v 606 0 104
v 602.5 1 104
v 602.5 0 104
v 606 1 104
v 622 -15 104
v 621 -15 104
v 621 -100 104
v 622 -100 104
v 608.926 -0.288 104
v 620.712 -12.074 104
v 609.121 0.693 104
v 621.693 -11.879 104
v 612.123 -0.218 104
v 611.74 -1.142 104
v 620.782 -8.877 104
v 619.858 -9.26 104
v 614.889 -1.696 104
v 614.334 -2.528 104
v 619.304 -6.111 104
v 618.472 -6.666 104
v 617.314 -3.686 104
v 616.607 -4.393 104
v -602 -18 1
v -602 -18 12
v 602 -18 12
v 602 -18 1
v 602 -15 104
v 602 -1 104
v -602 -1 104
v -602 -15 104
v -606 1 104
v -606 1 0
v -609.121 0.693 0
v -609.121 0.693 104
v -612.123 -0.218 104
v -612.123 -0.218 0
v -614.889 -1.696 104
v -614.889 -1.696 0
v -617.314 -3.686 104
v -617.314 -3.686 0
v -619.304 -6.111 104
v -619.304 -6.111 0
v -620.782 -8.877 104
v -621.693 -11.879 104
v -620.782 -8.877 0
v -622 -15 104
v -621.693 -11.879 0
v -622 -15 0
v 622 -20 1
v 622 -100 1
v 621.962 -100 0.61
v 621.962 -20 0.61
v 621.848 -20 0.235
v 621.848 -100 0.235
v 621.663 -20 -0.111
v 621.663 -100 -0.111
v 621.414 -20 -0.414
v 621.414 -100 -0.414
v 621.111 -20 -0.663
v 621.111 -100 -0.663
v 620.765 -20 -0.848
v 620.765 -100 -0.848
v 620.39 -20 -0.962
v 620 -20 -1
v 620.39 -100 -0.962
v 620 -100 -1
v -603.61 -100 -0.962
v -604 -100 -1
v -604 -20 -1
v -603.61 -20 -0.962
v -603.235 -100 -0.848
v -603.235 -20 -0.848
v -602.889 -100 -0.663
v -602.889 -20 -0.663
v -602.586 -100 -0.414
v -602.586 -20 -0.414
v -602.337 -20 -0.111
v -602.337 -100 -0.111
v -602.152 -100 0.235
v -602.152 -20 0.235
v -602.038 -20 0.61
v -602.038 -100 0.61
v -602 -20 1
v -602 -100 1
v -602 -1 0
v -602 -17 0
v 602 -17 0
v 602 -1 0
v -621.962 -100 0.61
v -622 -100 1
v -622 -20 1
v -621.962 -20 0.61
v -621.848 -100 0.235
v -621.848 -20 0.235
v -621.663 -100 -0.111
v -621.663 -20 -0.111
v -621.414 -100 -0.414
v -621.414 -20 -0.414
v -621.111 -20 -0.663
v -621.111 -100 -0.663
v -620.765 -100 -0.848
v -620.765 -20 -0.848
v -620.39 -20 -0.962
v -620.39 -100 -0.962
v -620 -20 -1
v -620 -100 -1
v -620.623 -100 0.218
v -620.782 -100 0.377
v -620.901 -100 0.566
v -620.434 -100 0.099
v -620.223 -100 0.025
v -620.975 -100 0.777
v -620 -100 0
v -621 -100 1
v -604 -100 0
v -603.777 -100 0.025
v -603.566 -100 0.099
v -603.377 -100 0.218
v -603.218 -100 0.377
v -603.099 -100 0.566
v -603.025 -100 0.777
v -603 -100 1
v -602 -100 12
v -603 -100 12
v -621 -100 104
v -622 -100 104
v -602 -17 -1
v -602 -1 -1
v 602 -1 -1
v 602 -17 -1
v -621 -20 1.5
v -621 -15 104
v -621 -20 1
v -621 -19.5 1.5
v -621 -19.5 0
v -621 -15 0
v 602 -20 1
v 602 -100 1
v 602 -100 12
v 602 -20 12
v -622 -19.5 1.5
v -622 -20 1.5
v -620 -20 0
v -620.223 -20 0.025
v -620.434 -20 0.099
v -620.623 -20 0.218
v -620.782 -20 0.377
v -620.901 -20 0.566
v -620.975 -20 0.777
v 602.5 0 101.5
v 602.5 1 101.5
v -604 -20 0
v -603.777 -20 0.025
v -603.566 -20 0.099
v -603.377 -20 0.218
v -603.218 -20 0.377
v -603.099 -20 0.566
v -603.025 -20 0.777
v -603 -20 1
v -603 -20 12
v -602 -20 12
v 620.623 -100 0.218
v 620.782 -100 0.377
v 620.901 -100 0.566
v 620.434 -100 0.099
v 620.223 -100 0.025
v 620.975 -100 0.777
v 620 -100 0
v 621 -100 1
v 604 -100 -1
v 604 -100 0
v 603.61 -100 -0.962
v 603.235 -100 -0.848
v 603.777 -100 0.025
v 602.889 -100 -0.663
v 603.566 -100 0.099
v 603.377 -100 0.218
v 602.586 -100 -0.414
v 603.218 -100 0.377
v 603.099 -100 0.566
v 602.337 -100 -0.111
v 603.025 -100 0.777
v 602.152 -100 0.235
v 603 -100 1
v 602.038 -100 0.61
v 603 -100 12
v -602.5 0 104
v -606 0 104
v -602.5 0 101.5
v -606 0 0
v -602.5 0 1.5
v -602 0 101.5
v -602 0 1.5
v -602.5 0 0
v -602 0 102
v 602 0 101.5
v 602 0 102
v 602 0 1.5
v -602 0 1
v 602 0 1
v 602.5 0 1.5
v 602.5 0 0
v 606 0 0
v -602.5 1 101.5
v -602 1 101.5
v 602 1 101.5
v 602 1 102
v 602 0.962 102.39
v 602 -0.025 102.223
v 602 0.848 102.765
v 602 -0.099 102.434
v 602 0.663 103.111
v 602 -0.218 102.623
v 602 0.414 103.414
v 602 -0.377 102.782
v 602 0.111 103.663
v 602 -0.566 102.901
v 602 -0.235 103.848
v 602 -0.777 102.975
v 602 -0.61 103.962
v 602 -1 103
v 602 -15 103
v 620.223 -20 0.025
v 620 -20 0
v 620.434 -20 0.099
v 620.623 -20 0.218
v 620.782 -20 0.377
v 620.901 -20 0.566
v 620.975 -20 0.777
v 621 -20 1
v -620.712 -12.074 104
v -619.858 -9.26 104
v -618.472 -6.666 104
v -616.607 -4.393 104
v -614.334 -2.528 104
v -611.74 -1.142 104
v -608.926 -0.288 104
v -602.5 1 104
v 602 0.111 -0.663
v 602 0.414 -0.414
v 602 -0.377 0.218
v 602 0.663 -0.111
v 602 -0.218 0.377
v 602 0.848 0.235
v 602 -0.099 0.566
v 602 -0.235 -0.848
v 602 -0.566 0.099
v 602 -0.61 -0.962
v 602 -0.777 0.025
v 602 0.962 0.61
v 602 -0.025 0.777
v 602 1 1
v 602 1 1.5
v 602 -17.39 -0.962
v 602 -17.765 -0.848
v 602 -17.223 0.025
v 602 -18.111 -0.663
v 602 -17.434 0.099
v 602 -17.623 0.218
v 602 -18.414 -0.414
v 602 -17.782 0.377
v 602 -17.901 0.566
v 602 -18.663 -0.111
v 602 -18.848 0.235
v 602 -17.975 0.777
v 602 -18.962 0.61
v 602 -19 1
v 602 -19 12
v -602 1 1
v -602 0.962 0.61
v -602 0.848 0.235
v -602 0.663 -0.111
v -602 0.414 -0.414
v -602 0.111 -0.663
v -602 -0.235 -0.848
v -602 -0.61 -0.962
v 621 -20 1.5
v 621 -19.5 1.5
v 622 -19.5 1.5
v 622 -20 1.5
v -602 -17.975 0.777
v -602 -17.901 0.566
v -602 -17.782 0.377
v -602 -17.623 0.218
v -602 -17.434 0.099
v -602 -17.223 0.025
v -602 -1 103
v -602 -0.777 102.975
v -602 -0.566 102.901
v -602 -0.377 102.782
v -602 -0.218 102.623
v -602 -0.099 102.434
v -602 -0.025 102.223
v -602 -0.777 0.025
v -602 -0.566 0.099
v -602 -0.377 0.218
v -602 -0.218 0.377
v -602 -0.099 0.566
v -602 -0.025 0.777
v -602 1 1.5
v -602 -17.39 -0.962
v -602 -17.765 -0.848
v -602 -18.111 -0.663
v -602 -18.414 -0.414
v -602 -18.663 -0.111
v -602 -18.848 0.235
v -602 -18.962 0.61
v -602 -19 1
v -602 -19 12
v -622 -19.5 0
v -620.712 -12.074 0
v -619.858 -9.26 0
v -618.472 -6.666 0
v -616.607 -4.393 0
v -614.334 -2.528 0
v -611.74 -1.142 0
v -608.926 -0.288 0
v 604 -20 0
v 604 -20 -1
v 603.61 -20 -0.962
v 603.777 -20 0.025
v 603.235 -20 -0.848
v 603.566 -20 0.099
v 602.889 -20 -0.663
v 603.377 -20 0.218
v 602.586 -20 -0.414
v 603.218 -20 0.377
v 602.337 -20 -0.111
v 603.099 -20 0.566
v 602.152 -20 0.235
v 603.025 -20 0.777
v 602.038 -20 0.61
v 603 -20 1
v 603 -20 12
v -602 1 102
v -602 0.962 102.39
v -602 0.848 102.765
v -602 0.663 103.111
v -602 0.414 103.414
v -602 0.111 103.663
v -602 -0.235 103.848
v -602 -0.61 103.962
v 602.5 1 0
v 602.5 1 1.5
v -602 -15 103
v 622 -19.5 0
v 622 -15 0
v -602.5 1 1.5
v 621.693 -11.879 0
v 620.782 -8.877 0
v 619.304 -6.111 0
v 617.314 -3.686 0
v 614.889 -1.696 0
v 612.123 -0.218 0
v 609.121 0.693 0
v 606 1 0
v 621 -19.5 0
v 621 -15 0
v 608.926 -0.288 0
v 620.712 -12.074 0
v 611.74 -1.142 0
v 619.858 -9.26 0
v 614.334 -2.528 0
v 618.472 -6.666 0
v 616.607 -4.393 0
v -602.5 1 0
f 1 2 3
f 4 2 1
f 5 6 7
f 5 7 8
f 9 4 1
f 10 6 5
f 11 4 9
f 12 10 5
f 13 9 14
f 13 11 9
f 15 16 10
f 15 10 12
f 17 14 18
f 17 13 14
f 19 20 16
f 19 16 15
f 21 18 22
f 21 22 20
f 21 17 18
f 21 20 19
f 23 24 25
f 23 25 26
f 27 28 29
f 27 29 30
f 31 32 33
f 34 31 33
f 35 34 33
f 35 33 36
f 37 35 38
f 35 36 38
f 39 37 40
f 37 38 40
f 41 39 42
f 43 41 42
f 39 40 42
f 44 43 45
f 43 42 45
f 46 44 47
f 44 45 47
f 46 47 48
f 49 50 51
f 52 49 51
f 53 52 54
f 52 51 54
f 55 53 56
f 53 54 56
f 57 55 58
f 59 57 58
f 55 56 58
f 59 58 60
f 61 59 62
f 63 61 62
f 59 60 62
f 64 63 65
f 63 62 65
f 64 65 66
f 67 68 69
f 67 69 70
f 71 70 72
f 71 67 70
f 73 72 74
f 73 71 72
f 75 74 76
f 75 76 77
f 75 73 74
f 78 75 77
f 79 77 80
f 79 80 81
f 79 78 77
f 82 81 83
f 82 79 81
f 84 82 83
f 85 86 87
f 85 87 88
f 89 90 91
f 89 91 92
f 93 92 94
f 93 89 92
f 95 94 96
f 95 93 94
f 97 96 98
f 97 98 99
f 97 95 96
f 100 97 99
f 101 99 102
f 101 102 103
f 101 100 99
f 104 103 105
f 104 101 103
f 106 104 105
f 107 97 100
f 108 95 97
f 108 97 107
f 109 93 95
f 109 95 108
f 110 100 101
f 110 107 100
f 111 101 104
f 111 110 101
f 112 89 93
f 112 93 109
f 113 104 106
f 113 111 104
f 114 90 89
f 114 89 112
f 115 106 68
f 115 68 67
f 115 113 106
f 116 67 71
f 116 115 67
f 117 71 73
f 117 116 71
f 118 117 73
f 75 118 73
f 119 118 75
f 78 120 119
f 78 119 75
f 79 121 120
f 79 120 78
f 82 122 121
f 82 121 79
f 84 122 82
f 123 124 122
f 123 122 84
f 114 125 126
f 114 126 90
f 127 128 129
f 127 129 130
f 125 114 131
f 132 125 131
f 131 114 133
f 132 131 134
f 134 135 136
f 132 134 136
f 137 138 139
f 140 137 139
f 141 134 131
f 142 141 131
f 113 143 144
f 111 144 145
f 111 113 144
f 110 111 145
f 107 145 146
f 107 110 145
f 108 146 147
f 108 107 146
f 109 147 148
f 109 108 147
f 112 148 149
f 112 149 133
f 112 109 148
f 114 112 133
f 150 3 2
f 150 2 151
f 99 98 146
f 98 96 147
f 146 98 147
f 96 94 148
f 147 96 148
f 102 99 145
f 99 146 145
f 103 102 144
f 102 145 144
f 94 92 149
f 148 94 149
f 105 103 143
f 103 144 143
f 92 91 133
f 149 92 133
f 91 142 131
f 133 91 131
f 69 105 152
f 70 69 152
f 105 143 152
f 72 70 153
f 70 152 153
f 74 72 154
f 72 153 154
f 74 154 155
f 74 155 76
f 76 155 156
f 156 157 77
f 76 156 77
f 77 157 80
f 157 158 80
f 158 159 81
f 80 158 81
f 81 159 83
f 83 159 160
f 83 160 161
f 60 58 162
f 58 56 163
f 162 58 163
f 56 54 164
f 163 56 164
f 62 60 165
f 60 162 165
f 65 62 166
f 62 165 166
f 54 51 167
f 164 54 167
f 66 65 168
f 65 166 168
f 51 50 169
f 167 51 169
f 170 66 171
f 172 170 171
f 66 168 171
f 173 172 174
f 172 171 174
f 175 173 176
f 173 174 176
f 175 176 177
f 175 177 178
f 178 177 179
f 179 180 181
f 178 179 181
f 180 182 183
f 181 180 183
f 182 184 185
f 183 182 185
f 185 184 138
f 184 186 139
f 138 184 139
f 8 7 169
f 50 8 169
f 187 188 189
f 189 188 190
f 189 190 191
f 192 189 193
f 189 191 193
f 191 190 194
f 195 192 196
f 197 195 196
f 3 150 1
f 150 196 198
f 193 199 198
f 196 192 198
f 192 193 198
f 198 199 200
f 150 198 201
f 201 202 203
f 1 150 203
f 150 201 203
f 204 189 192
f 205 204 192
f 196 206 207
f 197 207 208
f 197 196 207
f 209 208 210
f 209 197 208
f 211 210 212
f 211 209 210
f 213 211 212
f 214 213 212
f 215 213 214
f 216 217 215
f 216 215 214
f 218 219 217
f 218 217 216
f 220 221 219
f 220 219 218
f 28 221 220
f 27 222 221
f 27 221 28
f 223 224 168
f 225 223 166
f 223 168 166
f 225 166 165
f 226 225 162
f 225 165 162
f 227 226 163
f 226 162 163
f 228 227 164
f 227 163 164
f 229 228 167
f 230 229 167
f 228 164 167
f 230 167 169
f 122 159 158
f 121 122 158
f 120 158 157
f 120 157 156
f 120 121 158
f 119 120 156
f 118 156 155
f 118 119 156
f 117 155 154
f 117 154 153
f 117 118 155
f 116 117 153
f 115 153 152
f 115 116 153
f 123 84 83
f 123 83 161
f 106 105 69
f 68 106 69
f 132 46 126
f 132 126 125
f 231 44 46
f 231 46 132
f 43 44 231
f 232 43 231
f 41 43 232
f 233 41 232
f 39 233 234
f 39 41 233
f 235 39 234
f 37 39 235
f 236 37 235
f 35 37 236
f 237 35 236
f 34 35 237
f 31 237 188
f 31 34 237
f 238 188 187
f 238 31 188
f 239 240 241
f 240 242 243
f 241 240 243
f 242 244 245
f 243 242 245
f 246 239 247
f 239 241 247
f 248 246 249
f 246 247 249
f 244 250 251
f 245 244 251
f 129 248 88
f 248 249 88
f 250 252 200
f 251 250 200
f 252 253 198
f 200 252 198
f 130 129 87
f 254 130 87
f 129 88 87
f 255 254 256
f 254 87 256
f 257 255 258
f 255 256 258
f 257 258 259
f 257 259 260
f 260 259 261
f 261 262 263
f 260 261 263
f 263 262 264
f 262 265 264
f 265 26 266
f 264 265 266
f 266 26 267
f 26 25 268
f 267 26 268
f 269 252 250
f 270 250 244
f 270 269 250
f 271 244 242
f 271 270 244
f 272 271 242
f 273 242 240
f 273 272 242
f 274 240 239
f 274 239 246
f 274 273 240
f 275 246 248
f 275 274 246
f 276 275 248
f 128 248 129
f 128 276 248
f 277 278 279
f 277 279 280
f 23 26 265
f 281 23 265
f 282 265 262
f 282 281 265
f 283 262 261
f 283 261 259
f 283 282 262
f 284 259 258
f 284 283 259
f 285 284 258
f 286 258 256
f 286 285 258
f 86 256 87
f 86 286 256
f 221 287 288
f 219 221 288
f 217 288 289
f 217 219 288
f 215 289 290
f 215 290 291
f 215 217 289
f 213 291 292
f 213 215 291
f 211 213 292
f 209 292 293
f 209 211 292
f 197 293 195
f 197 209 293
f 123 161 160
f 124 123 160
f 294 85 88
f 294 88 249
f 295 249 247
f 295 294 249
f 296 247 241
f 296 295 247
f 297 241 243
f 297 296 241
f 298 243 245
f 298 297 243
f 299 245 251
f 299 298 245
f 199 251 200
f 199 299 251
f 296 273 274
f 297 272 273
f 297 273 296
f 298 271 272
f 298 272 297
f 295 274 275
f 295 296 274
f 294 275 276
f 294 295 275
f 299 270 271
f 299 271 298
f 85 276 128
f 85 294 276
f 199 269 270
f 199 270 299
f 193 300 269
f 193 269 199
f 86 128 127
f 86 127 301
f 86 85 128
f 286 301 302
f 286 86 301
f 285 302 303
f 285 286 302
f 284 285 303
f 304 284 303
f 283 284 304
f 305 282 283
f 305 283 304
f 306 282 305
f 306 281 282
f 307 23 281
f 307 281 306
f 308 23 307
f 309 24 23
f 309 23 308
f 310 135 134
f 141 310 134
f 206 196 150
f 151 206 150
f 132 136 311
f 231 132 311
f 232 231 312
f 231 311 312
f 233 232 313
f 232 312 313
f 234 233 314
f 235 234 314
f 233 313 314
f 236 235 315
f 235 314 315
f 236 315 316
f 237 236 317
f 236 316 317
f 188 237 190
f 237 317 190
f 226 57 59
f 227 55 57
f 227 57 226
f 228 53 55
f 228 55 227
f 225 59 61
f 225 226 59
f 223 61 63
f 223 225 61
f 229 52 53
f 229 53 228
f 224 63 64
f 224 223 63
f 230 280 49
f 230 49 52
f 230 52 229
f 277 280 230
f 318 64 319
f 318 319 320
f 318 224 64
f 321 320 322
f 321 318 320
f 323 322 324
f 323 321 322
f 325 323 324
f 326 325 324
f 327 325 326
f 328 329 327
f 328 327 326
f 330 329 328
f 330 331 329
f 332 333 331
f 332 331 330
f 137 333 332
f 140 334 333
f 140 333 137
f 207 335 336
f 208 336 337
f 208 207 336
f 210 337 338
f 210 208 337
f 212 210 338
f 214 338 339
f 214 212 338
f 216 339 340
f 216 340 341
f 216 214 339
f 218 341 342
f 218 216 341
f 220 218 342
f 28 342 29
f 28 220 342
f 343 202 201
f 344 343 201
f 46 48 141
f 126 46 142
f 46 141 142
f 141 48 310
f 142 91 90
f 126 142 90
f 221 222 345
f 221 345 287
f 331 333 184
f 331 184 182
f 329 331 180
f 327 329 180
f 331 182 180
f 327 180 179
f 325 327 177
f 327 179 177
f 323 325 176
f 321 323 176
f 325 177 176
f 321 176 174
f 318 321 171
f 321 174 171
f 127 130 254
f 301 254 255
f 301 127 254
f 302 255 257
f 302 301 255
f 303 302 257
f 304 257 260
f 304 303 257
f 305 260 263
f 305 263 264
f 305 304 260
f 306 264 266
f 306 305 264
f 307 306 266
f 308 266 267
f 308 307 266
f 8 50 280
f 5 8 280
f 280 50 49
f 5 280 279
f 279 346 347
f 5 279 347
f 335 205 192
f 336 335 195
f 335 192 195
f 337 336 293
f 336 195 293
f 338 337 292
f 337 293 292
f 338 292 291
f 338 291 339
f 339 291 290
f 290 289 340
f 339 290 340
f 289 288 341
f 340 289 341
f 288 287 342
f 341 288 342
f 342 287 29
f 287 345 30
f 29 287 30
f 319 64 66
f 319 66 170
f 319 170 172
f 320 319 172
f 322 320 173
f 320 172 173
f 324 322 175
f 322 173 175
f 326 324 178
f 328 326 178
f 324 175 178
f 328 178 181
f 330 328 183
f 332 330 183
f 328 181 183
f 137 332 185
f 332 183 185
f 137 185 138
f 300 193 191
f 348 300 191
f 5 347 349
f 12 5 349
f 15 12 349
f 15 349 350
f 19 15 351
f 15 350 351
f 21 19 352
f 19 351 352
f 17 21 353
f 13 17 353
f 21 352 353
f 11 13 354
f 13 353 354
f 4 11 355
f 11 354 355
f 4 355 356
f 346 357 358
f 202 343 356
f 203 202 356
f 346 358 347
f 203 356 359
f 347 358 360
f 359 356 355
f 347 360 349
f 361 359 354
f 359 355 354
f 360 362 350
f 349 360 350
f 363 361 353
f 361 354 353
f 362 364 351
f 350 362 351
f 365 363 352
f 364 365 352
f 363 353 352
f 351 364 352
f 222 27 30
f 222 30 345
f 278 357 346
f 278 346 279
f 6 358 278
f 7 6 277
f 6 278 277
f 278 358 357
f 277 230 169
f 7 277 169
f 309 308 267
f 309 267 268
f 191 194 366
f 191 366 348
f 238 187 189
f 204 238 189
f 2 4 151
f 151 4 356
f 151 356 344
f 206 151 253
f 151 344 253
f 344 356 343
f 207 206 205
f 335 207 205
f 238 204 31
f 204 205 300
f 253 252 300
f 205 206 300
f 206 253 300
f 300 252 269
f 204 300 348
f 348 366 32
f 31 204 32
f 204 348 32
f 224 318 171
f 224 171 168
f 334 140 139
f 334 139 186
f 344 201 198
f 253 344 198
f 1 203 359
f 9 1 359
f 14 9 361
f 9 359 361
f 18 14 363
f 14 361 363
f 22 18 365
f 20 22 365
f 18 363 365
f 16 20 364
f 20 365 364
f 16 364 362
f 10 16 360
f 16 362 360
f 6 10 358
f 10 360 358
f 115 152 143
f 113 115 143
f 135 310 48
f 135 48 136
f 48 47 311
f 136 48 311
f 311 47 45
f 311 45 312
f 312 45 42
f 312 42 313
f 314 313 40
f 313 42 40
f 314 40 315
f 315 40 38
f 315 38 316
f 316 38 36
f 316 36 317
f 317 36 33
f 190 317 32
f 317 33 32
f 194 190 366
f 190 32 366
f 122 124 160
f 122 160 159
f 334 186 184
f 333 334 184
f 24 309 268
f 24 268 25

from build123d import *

# Parameters (mm, degrees)
BASE_FLANGE1_DEPTH            = 104
EDGE_FLANGE1_STRIP_W          = 6
EDGE_FLANGE1_STRIP_H          = 1
EDGE_FLANGE1_STRIP_CUT_DEPTH  = 1204
EDGE_FLANGE1_RELIEF_W         = 6.5
EDGE_FLANGE1_RELIEF_H         = 0.5
EDGE_FLANGE1_RELIEF_CUT_DEPTH = 1
EDGE_FLANGE1_DEPTH            = 1204
EDGE_FLANGE2_STRIP_W          = 6
EDGE_FLANGE2_STRIP_H          = 1
EDGE_FLANGE2_STRIP_CUT_DEPTH  = 1204
EDGE_FLANGE2_DEPTH            = 1204
EDGE_FLANGE3_STRIP_W          = 6
EDGE_FLANGE3_STRIP_H          = 1
EDGE_FLANGE3_STRIP_CUT_DEPTH  = 80
EDGE_FLANGE3_RELIEF_W         = 6.5
EDGE_FLANGE3_RELIEF_H         = 0.5
EDGE_FLANGE3_RELIEF_CUT_DEPTH = 1
EDGE_FLANGE3_DEPTH            = 80
EDGE_FLANGE4_STRIP_W          = 6
EDGE_FLANGE4_STRIP_H          = 1
EDGE_FLANGE4_STRIP_CUT_DEPTH  = 80
EDGE_FLANGE4_DEPTH            = 80
EDGE_FLANGE5_STRIP_W          = 6
EDGE_FLANGE5_STRIP_H          = 1
EDGE_FLANGE5_STRIP_CUT_DEPTH  = 1204
EDGE_FLANGE5_RELIEF_W         = 6.5
EDGE_FLANGE5_RELIEF_H         = 0.5
EDGE_FLANGE5_RELIEF_CUT_DEPTH = 1
EDGE_FLANGE5_DEPTH            = 1204


# Sheet-metal steps are written as plain solids
with BuildPart() as part:
    # Sketch1 → Base-Flange1 (new body)
    with BuildSketch(Plane.XY):
        with BuildLine():
            Line((-621, -100), (-621, -15))
            ThreePointArc((-621, -15), (-616.606601718, -4.393398282), (-606, 0))
            Line((-606, 0), (606, 0))
            ThreePointArc((606, 0), (616.606601718, -4.393398282), (621, -15))
            Line((621, -15), (621, -100))
            Line((621, -100), (622, -100))
            Line((622, -100), (622, -15))
            ThreePointArc((622, -15), (617.313708499, -3.686291501), (606, 1))
            Line((606, 1), (-606, 1))
            ThreePointArc((-606, 1), (-617.313708499, -3.686291501), (-622, -15))
            Line((-622, -15), (-622, -100))
            Line((-622, -100), (-621, -100))
        make_face()
    extrude(amount=BASE_FLANGE1_DEPTH)

    # Edge-Flange1 strip (across the edge) → Edge-Flange1 strip cut (cut)
    with BuildSketch(Plane(origin=(-602, 0, 0), x_dir=(0, 0, 1), z_dir=(1, 0, 0))):
        with Locations((-2, -0.5)):
            Rectangle(EDGE_FLANGE1_STRIP_W, EDGE_FLANGE1_STRIP_H)
    extrude(amount=EDGE_FLANGE1_STRIP_CUT_DEPTH, mode=Mode.SUBTRACT)

    # Edge-Flange1 relief (on the sheet) → Edge-Flange1 relief cut (cut)
    with BuildSketch(Plane(origin=(-602, 0, 1), x_dir=(0, 0, 1), z_dir=(0, -1, 0))):
        with Locations((-2.75, 0.25)):
            Rectangle(EDGE_FLANGE1_RELIEF_W, EDGE_FLANGE1_RELIEF_H)
        with Locations((-2.75, -1204.25)):
            Rectangle(EDGE_FLANGE1_RELIEF_W, EDGE_FLANGE1_RELIEF_H)
    extrude(amount=-EDGE_FLANGE1_RELIEF_CUT_DEPTH, mode=Mode.SUBTRACT)

    # Edge-Flange1 section (across the edge) → Edge-Flange1 (add)
    with BuildSketch(Plane(origin=(-602, 0, 0), x_dir=(0, 0, 1), z_dir=(1, 0, 0))):
        with BuildLine():
            Line((-1, 1), (-1, 19))
            Line((-1, 19), (0, 19))
            Line((0, 19), (0, 1))
            ThreePointArc((0, 1), (0.292893219, 0.292893219), (1, 0))
            Line((1, 0), (1, -1))
            ThreePointArc((1, -1), (-0.414213562, -0.414213562), (-1, 1))
        make_face()
    extrude(amount=EDGE_FLANGE1_DEPTH)

    # Edge-Flange2 strip (across the edge) → Edge-Flange2 strip cut (cut)
    with BuildSketch(Plane(origin=(-602, -19, 0), x_dir=(0, 1, 0), z_dir=(1, 0, 0))):
        with Locations((-1, -0.5)):
            Rectangle(EDGE_FLANGE2_STRIP_W, EDGE_FLANGE2_STRIP_H)
    extrude(amount=EDGE_FLANGE2_STRIP_CUT_DEPTH, mode=Mode.SUBTRACT)

    # Edge-Flange2 section (across the edge) → Edge-Flange2 (add)
    with BuildSketch(Plane(origin=(-602, -19, 0), x_dir=(0, 1, 0), z_dir=(1, 0, 0))):
        with BuildLine():
            Line((0, 1), (0, 12))
            Line((0, 12), (1, 12))
            Line((1, 12), (1, 1))
            ThreePointArc((1, 1), (1.292893219, 0.292893219), (2, 0))
            Line((2, 0), (2, -1))
            ThreePointArc((2, -1), (0.585786438, -0.414213562), (0, 1))
        make_face()
    extrude(amount=EDGE_FLANGE2_DEPTH)

    # Edge-Flange3 strip (across the edge) → Edge-Flange3 strip cut (cut)
    with BuildSketch(Plane(origin=(-621, -100, 0), x_dir=(0, 0, 1), z_dir=(0, 1, 0))):
        with Locations((-2, -0.5)):
            Rectangle(EDGE_FLANGE3_STRIP_W, EDGE_FLANGE3_STRIP_H)
    edge_flange3_strip_cut = extrude(amount=EDGE_FLANGE3_STRIP_CUT_DEPTH, mode=Mode.SUBTRACT)

    # Edge-Flange3 relief (on the sheet) → Edge-Flange3 relief cut (cut)
    with BuildSketch(Plane(origin=(-621, -100, 1), x_dir=(0, 0, 1), z_dir=(1, 0, 0))):
        with Locations((-2.75, -80.25)):
            Rectangle(EDGE_FLANGE3_RELIEF_W, EDGE_FLANGE3_RELIEF_H)
    edge_flange3_relief_cut = extrude(amount=-EDGE_FLANGE3_RELIEF_CUT_DEPTH, mode=Mode.SUBTRACT)

    # Edge-Flange3 section (across the edge) → Edge-Flange3 (add)
    with BuildSketch(Plane(origin=(-621, -100, 0), x_dir=(0, 0, 1), z_dir=(0, 1, 0))):
        with BuildLine():
            Line((-1, 1), (-1, 19))
            Line((-1, 19), (0, 19))
            Line((0, 19), (0, 1))
            ThreePointArc((0, 1), (0.292893219, 0.292893219), (1, 0))
            Line((1, 0), (1, -1))
            ThreePointArc((1, -1), (-0.414213562, -0.414213562), (-1, 1))
        make_face()
    edge_flange3 = extrude(amount=EDGE_FLANGE3_DEPTH)

    # Edge-Flange4 strip (across the edge) → Edge-Flange4 strip cut (cut)
    with BuildSketch(Plane(origin=(-602, -100, 0), x_dir=(-1, 0, 0), z_dir=(0, 1, 0))):
        with Locations((-1, -0.5)):
            Rectangle(EDGE_FLANGE4_STRIP_W, EDGE_FLANGE4_STRIP_H)
    edge_flange4_strip_cut = extrude(amount=EDGE_FLANGE4_STRIP_CUT_DEPTH, mode=Mode.SUBTRACT)

    # Edge-Flange4 section (across the edge) → Edge-Flange4 (add)
    with BuildSketch(Plane(origin=(-602, -100, 0), x_dir=(-1, 0, 0), z_dir=(0, 1, 0))):
        with BuildLine():
            Line((0, 1), (0, 12))
            Line((0, 12), (1, 12))
            Line((1, 12), (1, 1))
            ThreePointArc((1, 1), (1.292893219, 0.292893219), (2, 0))
            Line((2, 0), (2, -1))
            ThreePointArc((2, -1), (0.585786438, -0.414213562), (0, 1))
        make_face()
    edge_flange4 = extrude(amount=EDGE_FLANGE4_DEPTH)

    # Mirror1: Edge-Flange3 strip cut, Edge-Flange3 relief cut, Edge-Flange3, Edge-Flange4 strip cut, Edge-Flange4 across plane
    add(edge_flange3_strip_cut.mirror(Plane(origin=(0, 0, 0), x_dir=(0, 0, 1), z_dir=(1, 0, 0))), mode=Mode.SUBTRACT)
    add(edge_flange3_relief_cut.mirror(Plane(origin=(0, 0, 0), x_dir=(0, 0, 1), z_dir=(1, 0, 0))), mode=Mode.SUBTRACT)
    add(edge_flange3.mirror(Plane(origin=(0, 0, 0), x_dir=(0, 0, 1), z_dir=(1, 0, 0))))
    add(edge_flange4_strip_cut.mirror(Plane(origin=(0, 0, 0), x_dir=(0, 0, 1), z_dir=(1, 0, 0))), mode=Mode.SUBTRACT)
    add(edge_flange4.mirror(Plane(origin=(0, 0, 0), x_dir=(0, 0, 1), z_dir=(1, 0, 0))))

    # Edge-Flange5 strip (across the edge) → Edge-Flange5 strip cut (cut)
    with BuildSketch(Plane(origin=(602, 0, 104), x_dir=(0, 0, -1), z_dir=(-1, 0, 0))):
        with Locations((-1, -0.5)):
            Rectangle(EDGE_FLANGE5_STRIP_W, EDGE_FLANGE5_STRIP_H)
    extrude(amount=EDGE_FLANGE5_STRIP_CUT_DEPTH, mode=Mode.SUBTRACT)

    # Edge-Flange5 relief (on the sheet) → Edge-Flange5 relief cut (cut)
    with BuildSketch(Plane(origin=(602, 0, 102), x_dir=(0, 0, -1), z_dir=(0, -1, 0))):
        with Locations((-2.75, 0.25)):
            Rectangle(EDGE_FLANGE5_RELIEF_W, EDGE_FLANGE5_RELIEF_H)
        with Locations((-2.75, -1204.25)):
            Rectangle(EDGE_FLANGE5_RELIEF_W, EDGE_FLANGE5_RELIEF_H)
    extrude(amount=-EDGE_FLANGE5_RELIEF_CUT_DEPTH, mode=Mode.SUBTRACT)

    # Edge-Flange5 section (across the edge) → Edge-Flange5 (add)
    with BuildSketch(Plane(origin=(602, 0, 104), x_dir=(0, 0, -1), z_dir=(-1, 0, 0))):
        with BuildLine():
            Line((0, 1), (0, 15))
            Line((0, 15), (1, 15))
            Line((1, 15), (1, 1))
            ThreePointArc((1, 1), (1.292893219, 0.292893219), (2, 0))
            Line((2, 0), (2, -1))
            ThreePointArc((2, -1), (0.585786438, -0.414213562), (0, 1))
        make_face()
    extrude(amount=EDGE_FLANGE5_DEPTH)


solid = part.part
